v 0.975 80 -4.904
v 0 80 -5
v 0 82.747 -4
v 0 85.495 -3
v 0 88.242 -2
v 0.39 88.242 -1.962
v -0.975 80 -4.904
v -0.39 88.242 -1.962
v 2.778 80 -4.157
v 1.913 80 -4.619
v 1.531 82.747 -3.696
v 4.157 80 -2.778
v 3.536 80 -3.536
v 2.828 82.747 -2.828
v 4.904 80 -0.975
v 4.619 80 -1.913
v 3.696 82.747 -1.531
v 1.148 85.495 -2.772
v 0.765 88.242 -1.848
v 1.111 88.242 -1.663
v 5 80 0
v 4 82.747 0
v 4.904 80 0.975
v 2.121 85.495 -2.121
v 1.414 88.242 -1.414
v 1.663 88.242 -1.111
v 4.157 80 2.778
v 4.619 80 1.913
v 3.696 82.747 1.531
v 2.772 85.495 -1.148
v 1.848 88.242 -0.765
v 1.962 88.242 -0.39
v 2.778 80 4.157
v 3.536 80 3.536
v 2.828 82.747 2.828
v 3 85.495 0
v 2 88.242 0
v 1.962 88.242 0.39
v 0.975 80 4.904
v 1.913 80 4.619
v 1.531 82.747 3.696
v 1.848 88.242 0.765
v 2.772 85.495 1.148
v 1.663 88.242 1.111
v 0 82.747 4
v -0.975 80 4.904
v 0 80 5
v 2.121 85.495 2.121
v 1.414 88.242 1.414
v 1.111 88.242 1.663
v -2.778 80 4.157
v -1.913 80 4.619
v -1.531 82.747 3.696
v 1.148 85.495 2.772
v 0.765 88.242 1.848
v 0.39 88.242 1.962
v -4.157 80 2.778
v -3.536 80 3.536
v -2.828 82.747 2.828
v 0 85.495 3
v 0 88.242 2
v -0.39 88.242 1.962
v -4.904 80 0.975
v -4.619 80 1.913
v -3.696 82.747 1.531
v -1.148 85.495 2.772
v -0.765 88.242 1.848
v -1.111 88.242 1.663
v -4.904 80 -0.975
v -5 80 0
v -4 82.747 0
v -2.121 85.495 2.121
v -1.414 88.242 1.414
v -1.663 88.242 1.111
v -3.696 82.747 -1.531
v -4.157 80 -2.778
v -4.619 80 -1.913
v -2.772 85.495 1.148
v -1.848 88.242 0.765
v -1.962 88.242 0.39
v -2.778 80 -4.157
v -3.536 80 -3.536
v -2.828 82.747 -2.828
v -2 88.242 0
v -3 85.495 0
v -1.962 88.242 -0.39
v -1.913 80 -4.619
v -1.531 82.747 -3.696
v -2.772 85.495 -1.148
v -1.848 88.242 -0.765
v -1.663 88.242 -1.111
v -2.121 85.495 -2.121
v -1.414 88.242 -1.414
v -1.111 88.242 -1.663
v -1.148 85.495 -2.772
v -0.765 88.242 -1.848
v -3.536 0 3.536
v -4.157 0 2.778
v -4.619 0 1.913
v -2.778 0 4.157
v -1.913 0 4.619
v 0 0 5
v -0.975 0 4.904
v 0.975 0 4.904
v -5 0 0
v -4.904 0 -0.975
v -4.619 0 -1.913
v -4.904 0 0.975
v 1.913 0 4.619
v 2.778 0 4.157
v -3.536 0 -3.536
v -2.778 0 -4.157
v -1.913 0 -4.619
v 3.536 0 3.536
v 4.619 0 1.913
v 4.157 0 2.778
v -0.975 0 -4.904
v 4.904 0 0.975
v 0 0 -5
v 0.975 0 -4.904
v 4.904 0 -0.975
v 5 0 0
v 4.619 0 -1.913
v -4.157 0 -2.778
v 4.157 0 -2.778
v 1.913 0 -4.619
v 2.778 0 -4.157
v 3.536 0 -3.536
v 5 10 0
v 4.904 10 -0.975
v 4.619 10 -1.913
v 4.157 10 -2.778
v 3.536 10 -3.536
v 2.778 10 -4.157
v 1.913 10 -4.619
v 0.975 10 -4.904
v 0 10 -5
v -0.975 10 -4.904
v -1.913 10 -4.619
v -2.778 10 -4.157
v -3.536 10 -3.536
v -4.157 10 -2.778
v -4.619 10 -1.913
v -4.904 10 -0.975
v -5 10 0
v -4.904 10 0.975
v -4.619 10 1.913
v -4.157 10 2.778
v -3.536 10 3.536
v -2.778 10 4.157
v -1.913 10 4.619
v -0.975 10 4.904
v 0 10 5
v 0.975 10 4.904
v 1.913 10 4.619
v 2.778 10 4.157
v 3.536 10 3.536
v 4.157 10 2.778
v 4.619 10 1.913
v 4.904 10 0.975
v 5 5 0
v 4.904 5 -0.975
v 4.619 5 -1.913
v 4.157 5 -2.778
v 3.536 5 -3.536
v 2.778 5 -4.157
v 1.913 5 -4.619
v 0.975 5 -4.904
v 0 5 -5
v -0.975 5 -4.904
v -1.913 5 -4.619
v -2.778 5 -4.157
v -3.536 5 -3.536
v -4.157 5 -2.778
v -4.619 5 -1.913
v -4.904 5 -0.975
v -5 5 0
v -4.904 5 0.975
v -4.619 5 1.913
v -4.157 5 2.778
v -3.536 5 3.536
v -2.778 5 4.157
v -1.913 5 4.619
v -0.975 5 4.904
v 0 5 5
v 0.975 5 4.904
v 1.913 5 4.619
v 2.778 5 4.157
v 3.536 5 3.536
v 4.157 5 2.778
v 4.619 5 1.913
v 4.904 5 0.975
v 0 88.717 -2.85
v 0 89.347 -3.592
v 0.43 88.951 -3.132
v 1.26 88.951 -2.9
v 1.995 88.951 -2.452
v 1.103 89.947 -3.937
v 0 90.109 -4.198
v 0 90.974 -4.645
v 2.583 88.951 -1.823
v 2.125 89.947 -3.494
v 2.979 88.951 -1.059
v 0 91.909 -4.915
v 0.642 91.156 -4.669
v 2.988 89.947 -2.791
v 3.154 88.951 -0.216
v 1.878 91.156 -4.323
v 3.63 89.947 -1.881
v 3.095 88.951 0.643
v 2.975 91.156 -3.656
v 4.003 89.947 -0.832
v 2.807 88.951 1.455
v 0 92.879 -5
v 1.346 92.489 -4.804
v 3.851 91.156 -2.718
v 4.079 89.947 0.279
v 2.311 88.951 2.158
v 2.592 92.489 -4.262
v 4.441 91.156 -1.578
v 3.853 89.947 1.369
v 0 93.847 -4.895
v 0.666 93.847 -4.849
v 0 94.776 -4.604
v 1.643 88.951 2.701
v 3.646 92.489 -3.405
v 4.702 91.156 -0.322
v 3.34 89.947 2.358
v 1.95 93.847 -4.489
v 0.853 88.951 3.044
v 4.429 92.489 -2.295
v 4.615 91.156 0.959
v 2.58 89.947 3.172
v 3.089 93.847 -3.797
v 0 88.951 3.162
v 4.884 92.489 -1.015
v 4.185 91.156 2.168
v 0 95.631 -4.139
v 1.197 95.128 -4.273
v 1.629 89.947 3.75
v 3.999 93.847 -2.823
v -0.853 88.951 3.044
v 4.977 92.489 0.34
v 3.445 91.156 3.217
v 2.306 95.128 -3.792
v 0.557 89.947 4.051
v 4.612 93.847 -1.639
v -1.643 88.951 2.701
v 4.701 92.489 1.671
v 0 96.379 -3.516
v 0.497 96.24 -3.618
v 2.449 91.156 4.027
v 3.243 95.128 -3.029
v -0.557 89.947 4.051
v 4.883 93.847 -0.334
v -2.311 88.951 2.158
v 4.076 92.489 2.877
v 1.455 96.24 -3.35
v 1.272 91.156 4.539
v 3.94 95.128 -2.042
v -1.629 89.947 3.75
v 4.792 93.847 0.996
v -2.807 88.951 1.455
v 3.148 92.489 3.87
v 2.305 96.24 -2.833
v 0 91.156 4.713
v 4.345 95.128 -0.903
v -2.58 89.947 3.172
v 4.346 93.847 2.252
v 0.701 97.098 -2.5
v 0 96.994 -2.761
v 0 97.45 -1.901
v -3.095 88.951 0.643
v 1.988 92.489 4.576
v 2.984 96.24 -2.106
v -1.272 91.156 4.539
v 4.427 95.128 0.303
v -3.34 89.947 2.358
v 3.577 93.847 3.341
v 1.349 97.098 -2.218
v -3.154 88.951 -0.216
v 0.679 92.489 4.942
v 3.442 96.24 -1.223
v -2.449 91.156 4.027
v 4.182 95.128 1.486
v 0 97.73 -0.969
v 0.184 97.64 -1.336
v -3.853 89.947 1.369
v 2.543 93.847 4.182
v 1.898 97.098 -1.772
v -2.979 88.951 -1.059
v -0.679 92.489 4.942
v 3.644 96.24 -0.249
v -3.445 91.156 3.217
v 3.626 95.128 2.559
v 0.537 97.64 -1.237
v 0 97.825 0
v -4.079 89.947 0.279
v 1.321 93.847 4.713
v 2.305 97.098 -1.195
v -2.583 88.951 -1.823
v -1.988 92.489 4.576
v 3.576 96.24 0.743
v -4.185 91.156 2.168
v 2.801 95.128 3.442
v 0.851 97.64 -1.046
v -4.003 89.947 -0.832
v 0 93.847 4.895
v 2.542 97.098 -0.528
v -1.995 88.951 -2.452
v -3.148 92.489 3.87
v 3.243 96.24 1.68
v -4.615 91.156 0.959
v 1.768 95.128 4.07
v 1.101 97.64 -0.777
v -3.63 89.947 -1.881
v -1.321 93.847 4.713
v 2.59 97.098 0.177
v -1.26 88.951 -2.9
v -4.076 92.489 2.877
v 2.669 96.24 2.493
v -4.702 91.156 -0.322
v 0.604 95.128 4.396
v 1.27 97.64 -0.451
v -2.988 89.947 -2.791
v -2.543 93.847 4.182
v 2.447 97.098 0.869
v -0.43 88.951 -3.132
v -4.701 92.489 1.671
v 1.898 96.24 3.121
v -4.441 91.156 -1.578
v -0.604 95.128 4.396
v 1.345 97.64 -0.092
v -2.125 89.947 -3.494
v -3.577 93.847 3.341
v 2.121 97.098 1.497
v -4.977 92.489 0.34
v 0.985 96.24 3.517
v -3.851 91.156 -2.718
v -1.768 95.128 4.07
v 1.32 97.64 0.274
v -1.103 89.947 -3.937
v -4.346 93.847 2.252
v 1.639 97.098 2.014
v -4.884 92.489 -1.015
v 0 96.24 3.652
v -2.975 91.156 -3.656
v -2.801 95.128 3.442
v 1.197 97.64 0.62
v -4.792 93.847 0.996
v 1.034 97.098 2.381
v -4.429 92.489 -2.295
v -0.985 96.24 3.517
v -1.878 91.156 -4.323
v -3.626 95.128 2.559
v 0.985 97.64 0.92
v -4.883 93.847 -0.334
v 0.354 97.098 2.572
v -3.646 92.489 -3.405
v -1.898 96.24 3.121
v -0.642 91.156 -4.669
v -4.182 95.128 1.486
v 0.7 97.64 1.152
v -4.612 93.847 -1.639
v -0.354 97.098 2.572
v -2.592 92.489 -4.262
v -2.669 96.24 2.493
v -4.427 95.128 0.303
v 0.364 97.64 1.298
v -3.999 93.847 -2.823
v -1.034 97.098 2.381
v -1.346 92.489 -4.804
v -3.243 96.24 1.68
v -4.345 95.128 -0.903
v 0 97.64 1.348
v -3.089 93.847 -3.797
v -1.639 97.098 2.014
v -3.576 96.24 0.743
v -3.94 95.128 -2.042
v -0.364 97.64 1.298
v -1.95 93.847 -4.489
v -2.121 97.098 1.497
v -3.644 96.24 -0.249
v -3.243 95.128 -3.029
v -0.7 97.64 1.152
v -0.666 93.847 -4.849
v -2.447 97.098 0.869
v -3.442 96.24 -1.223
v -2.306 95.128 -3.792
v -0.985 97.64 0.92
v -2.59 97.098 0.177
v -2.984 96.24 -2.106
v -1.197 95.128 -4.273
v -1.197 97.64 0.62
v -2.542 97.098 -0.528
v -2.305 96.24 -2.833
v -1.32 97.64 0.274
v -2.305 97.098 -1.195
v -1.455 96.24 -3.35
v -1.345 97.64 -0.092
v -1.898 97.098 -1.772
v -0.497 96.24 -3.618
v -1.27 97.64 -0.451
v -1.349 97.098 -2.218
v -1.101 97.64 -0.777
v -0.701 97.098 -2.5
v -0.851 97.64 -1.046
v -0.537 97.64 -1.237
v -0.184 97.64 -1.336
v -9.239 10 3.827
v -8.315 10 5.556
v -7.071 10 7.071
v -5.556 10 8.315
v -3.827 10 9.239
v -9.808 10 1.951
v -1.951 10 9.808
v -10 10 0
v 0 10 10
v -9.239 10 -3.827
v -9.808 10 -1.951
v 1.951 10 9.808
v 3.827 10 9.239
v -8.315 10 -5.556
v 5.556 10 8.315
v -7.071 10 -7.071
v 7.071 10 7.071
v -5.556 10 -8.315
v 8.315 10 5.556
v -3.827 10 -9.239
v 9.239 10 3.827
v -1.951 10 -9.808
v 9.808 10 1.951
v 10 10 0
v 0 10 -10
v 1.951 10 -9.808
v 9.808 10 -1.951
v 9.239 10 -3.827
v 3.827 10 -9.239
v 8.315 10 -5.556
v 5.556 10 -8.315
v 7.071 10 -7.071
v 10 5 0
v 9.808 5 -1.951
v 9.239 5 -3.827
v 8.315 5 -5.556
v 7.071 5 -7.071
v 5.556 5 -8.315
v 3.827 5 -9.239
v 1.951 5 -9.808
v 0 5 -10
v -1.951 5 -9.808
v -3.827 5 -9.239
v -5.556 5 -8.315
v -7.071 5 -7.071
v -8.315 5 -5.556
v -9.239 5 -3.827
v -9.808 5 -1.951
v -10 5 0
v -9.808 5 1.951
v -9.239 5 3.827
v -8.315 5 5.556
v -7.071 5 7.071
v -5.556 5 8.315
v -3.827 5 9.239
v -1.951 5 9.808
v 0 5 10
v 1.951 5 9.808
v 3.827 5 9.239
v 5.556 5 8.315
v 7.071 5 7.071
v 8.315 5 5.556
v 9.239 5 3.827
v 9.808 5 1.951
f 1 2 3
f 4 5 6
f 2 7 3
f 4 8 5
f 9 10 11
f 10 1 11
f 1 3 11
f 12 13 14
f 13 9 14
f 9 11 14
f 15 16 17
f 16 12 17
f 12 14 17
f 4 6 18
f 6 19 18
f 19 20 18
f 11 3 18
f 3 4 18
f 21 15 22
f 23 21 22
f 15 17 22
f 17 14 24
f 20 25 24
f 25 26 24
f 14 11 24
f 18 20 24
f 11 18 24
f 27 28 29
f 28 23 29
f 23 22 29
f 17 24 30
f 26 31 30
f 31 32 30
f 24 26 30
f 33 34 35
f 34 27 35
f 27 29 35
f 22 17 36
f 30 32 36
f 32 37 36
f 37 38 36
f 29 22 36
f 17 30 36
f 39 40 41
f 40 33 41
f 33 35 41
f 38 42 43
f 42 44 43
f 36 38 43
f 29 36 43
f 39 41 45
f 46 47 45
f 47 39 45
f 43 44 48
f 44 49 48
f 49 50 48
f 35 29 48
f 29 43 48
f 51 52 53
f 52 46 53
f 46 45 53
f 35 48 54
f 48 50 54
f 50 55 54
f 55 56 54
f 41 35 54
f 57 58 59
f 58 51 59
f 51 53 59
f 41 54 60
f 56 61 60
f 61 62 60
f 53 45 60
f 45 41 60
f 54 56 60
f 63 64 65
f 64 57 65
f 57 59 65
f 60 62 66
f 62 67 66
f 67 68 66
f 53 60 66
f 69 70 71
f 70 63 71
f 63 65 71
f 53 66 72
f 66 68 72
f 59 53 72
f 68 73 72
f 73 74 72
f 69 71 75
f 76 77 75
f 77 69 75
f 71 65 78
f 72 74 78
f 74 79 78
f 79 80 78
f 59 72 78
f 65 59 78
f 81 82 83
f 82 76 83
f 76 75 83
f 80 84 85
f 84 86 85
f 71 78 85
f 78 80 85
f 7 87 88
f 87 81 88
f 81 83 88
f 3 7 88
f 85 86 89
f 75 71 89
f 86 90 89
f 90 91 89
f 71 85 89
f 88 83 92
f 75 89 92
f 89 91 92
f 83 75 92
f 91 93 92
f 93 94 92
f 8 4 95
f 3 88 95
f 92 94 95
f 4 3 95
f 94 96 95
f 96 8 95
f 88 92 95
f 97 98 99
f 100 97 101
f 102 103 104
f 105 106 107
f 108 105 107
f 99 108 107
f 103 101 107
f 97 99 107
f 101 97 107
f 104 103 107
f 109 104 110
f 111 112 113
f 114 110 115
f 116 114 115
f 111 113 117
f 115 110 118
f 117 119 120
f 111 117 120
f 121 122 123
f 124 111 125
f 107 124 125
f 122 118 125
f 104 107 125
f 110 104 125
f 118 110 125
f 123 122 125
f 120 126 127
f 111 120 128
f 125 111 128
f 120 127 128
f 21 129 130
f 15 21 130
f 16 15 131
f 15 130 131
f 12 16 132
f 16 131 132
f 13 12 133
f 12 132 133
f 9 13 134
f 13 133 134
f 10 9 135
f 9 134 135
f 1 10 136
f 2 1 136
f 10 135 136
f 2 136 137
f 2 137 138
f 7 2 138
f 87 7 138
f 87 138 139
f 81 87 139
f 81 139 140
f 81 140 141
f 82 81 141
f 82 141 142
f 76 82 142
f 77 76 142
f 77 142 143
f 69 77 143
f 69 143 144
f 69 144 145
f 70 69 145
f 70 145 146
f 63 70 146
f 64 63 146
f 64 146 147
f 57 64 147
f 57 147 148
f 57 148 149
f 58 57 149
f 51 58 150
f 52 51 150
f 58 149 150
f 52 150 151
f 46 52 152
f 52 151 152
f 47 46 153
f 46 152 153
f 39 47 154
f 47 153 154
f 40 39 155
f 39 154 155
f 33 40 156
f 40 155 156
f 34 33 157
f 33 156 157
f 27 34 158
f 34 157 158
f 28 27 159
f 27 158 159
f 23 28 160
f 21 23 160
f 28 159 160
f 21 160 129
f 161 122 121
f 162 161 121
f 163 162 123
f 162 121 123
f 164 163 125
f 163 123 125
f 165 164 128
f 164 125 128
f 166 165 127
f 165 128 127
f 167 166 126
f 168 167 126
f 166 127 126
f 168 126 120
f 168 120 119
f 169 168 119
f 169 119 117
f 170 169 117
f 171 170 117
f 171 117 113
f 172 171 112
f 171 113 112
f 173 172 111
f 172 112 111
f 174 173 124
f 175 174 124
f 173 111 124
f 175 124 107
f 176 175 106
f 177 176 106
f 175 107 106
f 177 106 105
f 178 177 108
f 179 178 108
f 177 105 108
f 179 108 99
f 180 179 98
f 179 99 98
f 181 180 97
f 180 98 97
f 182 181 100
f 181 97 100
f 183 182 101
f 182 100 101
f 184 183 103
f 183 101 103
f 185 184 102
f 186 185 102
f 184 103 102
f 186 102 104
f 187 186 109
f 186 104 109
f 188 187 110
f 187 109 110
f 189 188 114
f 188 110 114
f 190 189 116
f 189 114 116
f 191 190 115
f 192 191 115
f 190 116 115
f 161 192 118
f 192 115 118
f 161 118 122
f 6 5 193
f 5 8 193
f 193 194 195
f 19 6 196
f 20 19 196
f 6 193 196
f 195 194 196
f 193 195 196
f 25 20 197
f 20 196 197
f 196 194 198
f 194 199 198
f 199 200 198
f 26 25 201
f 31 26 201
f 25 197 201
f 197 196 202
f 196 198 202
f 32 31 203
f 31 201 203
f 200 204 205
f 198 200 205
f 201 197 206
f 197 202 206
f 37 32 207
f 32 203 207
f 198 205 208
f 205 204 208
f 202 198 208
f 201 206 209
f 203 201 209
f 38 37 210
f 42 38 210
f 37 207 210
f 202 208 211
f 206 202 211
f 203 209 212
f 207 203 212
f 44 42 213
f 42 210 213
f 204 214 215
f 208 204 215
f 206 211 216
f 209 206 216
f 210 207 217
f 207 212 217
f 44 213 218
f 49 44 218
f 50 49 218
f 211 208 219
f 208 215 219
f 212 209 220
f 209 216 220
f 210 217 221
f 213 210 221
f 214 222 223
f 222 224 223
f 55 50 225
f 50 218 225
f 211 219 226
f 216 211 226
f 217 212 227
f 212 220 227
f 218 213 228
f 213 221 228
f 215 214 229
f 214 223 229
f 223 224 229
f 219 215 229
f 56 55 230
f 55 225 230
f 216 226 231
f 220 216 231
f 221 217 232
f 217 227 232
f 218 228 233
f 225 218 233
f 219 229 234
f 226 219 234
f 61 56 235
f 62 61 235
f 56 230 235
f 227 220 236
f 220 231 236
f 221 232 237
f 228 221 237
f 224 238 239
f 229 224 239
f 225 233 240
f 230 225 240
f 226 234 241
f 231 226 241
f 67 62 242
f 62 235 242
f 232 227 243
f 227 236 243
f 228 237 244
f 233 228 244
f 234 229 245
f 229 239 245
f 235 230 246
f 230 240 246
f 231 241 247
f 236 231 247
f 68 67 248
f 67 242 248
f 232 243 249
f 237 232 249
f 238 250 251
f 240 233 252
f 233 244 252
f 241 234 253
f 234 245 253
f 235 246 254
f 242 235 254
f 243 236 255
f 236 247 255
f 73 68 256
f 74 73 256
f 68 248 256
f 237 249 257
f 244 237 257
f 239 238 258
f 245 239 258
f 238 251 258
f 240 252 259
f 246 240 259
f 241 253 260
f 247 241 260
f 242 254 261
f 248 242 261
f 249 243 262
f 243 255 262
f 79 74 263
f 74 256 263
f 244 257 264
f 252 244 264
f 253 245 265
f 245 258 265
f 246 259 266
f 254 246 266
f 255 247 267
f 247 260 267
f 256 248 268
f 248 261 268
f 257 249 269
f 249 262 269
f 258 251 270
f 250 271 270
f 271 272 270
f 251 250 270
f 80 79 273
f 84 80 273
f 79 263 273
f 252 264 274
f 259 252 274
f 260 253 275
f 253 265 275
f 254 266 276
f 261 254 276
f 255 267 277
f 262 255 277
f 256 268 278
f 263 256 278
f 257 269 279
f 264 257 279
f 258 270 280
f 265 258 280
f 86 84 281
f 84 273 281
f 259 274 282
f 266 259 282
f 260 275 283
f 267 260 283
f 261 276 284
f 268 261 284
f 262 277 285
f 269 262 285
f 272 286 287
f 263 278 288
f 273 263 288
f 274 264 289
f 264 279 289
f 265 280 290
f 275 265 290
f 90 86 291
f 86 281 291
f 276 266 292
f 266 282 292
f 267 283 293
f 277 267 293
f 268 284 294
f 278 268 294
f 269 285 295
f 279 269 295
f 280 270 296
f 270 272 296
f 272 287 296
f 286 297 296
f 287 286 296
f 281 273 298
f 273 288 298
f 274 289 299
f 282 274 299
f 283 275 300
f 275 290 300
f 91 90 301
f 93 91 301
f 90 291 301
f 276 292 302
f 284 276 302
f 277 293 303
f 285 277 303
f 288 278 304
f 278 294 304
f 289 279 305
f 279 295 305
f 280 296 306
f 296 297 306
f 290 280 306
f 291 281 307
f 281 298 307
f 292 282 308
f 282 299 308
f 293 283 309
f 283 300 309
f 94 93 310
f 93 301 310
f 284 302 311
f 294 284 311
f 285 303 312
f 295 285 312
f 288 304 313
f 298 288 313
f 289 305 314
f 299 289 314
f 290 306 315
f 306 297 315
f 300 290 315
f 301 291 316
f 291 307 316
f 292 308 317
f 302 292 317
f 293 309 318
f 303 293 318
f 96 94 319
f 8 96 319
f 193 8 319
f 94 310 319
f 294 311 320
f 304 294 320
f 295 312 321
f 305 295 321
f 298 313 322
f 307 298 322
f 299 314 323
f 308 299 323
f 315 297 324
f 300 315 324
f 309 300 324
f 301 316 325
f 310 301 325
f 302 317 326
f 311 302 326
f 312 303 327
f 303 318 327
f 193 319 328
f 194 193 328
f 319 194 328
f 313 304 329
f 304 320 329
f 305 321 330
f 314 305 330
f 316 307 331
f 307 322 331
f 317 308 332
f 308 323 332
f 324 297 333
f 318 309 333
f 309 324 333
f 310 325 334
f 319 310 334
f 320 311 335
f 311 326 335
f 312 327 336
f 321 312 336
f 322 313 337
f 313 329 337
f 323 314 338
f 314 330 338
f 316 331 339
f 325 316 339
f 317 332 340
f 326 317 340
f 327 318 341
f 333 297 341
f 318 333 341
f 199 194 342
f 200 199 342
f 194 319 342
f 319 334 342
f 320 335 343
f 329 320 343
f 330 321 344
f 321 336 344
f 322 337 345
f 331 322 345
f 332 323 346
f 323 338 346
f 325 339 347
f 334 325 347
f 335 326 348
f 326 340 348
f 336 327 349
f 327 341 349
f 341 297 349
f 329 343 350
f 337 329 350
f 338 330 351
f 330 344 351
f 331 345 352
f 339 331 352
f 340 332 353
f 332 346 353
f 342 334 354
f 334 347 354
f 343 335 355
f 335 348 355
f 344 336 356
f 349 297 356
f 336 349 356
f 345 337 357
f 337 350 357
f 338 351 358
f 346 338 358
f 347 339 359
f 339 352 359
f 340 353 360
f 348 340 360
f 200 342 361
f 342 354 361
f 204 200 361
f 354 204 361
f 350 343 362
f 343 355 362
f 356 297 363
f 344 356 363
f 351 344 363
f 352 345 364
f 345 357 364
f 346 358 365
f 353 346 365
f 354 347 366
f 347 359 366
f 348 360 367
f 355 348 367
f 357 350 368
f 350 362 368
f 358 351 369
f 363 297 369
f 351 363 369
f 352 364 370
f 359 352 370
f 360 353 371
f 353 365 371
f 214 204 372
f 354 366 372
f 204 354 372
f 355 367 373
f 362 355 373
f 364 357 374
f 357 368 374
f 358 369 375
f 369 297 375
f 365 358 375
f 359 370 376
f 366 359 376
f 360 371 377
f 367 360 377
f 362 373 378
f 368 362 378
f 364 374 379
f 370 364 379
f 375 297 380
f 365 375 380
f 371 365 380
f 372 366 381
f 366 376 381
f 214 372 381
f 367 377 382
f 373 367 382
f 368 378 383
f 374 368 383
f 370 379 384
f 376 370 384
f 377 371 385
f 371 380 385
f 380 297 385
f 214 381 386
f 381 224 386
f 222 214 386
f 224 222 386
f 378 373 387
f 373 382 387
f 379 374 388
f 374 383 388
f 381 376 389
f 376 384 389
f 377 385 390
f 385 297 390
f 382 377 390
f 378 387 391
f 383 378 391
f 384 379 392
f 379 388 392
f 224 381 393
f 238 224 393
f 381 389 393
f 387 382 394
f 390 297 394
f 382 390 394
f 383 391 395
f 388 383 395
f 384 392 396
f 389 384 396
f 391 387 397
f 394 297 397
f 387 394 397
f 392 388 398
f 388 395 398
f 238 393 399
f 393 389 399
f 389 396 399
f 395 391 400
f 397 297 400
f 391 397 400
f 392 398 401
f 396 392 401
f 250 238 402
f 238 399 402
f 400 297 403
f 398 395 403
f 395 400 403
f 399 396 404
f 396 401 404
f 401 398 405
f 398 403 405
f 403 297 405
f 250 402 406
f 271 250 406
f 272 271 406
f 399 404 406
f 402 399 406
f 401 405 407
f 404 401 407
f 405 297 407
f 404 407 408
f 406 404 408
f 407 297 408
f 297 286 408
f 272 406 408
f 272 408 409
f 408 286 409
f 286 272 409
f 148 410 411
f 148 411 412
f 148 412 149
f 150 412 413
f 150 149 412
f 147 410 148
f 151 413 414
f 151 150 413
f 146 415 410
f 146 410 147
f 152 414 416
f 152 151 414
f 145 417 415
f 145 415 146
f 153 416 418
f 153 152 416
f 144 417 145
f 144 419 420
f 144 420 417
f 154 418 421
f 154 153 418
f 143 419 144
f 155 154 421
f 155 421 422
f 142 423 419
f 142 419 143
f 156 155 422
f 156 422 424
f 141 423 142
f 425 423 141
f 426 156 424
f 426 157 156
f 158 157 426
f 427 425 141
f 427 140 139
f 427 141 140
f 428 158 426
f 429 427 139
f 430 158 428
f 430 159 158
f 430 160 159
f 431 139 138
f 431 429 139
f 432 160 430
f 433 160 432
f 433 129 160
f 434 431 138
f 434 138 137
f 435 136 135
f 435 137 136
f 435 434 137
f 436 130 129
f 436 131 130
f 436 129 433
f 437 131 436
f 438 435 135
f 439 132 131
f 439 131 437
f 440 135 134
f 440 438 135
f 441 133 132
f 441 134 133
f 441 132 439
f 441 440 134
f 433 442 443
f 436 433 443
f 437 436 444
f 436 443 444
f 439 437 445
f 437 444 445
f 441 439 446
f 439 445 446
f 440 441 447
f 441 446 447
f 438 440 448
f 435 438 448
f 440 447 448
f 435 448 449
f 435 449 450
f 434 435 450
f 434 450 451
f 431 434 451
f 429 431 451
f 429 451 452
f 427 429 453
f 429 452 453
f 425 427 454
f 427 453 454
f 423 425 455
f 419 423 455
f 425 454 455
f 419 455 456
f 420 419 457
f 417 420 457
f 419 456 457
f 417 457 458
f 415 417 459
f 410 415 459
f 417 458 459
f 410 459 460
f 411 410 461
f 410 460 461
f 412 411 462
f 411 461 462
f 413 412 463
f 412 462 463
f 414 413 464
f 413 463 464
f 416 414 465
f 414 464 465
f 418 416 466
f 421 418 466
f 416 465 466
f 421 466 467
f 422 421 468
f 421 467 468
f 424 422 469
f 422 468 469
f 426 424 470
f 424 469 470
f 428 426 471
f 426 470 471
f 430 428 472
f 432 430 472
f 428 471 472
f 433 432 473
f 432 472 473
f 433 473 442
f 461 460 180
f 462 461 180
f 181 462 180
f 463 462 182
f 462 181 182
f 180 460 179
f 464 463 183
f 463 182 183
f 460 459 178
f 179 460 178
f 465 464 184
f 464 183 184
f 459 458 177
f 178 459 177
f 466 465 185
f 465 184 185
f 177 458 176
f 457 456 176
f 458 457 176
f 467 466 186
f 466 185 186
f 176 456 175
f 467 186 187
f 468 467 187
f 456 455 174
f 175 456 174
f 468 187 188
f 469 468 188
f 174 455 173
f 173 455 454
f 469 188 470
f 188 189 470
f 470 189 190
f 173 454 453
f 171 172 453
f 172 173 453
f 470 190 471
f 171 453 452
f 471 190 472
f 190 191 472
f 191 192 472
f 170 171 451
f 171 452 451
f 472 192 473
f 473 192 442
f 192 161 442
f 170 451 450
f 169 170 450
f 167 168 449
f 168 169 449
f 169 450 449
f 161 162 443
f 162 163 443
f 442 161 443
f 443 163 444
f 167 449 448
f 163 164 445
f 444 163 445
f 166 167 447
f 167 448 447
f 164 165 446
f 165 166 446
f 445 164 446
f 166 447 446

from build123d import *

# Parameters (mm, degrees)
SKETCH1_R           = 5
BOSS_EXTRUDE1_DEPTH = 5
SKETCH2_R           = 10
BOSS_EXTRUDE2_DEPTH = 5
SKETCH3_R           = 5
BOSS_EXTRUDE3_DEPTH = 70


with BuildPart() as part:
    # Sketch1 → Boss-Extrude1 (new body)
    with BuildSketch(Plane(origin=(0, 0, 0), x_dir=(1, 0, 0), z_dir=(0, 1, 0))):
        Circle(SKETCH1_R)
    extrude(amount=BOSS_EXTRUDE1_DEPTH)

    # Sketch2 → Boss-Extrude2 (add)
    with BuildSketch(Plane(origin=(0, 5, 0), x_dir=(1, 0, 0), z_dir=(0, 1, 0))):
        Circle(SKETCH2_R)
    extrude(amount=BOSS_EXTRUDE2_DEPTH)

    # Sketch3 → Boss-Extrude3 (add)
    with BuildSketch(Plane(origin=(0, 10, 0), x_dir=(1, 0, 0), z_dir=(0, 1, 0))):
        Circle(SKETCH3_R)
    extrude(amount=BOSS_EXTRUDE3_DEPTH)

    # Sketch4 → Revolve1 (revolve)
    with BuildSketch(Plane(origin=(0, 0, 0), x_dir=(0, 0, -1), z_dir=(1, 0, 0))):
        with BuildLine():
            Line((5, 80), (2, 88.242432258))
            ThreePointArc((2, 88.242432258), (4.894531565, 93.846556172), (0, 97.825007953))
            Line((0, 97.825007953), (0, 80))
            Line((0, 80), (5, 80))
        make_face()
    revolve(axis=Axis((0, 97.825007953, 0), (0, -1, 0)))


solid = part.part
